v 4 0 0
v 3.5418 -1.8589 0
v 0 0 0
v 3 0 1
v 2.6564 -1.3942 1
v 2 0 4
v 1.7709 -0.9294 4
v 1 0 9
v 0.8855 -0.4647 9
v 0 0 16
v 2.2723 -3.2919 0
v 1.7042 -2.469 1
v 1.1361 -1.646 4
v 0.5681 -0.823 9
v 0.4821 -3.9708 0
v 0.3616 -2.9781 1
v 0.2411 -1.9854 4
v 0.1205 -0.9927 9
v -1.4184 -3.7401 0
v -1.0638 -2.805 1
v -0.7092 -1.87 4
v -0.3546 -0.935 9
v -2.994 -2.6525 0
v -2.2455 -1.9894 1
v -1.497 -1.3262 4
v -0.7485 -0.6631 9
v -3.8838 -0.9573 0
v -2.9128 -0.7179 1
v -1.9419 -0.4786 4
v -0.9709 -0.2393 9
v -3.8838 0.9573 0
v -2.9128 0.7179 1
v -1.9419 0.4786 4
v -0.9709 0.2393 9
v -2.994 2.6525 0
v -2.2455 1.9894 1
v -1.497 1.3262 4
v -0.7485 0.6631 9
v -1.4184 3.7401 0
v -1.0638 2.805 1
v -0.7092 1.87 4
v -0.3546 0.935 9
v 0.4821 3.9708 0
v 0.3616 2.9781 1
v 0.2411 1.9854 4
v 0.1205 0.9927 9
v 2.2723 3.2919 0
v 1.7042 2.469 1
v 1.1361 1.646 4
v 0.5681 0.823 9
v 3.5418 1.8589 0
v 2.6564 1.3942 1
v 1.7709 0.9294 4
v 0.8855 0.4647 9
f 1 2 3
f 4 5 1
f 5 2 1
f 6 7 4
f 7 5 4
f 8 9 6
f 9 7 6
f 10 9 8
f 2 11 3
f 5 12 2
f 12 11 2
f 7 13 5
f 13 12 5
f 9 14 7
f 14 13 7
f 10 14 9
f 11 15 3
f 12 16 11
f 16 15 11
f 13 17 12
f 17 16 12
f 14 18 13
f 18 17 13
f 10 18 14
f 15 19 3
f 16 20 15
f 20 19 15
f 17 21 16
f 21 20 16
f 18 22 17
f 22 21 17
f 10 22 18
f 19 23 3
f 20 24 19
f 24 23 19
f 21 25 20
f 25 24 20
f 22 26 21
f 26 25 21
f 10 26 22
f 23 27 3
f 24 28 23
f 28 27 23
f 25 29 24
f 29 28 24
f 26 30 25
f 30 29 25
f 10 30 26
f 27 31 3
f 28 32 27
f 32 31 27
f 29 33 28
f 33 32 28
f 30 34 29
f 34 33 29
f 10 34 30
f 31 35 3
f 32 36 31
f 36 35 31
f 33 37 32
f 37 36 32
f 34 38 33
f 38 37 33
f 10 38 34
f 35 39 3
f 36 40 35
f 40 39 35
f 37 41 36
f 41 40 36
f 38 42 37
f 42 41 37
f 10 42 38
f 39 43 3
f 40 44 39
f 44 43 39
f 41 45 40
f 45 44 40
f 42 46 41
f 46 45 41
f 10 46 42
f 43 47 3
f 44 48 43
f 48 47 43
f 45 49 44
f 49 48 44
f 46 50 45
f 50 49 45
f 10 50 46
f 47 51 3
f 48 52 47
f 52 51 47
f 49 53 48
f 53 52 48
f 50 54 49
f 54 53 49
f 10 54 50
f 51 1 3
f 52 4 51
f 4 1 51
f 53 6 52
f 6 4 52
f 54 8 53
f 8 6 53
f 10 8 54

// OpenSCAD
function n_cuadrados(n)
    = n == 0
    ? []
    : concat(n_cuadrados(n-1), pow(n, 2));

function zip(a1, a2, i=0, arr=[])
    = i >= len(a1) || i >= len(a2)
    ? arr
    : zip(a1, a2, i+1, concat(arr, [[a1[i], a2[i]]]));
    
    
function nats(n)
    = n == 0
    ? []
    : concat(nats(n-1), n);
    
function numeros(n) = zip(nats(n), n_cuadrados(n));


function wrap(arr) = concat([[0,0]], arr, [[arr[len(arr)-1][0],0]]);

rotate_extrude()translate([-4,0,0])polygon(wrap(numeros(4)));
echo(numeros(4));


echo(n_cuadrados(7));
